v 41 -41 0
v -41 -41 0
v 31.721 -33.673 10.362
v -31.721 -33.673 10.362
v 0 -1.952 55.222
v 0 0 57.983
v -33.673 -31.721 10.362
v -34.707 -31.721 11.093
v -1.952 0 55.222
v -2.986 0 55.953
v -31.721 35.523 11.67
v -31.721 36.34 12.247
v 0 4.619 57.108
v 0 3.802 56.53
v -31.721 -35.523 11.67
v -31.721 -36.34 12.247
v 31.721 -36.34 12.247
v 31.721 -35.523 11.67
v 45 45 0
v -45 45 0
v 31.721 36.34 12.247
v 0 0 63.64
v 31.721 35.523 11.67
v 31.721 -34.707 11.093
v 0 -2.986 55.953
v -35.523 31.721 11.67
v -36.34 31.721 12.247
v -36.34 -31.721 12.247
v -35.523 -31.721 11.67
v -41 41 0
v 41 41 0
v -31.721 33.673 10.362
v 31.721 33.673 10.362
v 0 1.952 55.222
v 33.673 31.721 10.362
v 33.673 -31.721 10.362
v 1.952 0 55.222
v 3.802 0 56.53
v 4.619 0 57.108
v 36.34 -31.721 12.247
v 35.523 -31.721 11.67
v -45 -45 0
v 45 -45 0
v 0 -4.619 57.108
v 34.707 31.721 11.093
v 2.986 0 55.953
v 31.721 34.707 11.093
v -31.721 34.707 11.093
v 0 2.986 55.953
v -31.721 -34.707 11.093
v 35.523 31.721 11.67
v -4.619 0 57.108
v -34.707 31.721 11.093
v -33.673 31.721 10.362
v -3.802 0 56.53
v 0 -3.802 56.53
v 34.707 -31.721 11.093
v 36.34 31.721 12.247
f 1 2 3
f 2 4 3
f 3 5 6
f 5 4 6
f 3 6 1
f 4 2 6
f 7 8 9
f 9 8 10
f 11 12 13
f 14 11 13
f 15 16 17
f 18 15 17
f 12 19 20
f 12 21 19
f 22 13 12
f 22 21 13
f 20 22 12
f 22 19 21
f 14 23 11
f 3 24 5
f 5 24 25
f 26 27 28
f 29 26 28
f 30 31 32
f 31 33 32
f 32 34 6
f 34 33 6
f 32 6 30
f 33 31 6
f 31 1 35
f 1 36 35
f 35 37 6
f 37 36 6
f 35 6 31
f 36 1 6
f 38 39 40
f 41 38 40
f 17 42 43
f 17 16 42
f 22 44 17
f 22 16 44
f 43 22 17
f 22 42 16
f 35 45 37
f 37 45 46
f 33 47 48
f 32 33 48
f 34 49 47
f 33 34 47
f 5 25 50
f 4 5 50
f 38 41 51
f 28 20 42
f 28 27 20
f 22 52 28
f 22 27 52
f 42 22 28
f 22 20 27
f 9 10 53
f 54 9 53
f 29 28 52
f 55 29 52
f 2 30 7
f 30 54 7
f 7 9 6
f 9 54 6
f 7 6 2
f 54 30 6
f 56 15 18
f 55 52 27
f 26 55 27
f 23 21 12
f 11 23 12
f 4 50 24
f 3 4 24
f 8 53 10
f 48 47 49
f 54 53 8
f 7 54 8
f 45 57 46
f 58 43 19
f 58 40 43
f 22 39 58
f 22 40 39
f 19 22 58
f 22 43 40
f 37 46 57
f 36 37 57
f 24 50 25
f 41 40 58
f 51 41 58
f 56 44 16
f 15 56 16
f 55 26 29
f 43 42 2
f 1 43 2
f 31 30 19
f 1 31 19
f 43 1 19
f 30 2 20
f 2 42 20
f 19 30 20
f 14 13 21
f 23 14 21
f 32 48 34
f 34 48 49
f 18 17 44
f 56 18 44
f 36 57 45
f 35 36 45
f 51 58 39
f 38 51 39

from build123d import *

# Parameters (mm, degrees)
F3_W      = 90
F3_H      = 90
F8_W      = 82
F8_H      = 82
F14_DEPTH = 1
F15_START = -2
F15_DEPTH = 3
F17_DEPTH = 1
F18_START = -2
F18_DEPTH = 3
F20_DEPTH = 1
F21_START = -2
F21_DEPTH = 3
F23_DEPTH = 1
F24_START = -2
F24_DEPTH = 3


with BuildPart() as f6:
    # F3 (on Top) → F6 section 0
    with BuildSketch(Plane.XY, mode=Mode.PRIVATE) as f6_s0:
        Rectangle(F3_W, F3_H)
    loft([f6_s0.sketch, Vertex(0, 0, 63.6396103068)])

    # F8 (on Top) → F10 section 0
    with BuildSketch(Plane.XY, mode=Mode.PRIVATE) as f10_s0:
        Rectangle(F8_W, F8_H)
    loft([f10_s0.sketch, Vertex(0, 0, 57.9827560573)], mode=Mode.SUBTRACT)

    # F13 (on offset) → F14 (cut)
    with BuildSketch(Plane(origin=(0, -30, 21.2132034356), x_dir=(1, 0, 0), z_dir=(0, -0.8164965809, 0.5773502692))):
        Polygon((31.7209438086, -10.9807621135), (0, 43.9615242271), (-31.7209438086, -10.9807621135), align=None)
    extrude(amount=-F14_DEPTH, mode=Mode.SUBTRACT)

    # F13 (on offset) → F15 (cut)
    with BuildSketch(Plane(origin=(0, -30, 21.2132034356), x_dir=(1, 0, 0), z_dir=(0, -0.8164965809, 0.5773502692)).offset(F15_START)):
        Polygon((31.7209438086, -10.9807621135), (0, 43.9615242271), (-31.7209438086, -10.9807621135), align=None)
    extrude(amount=-F15_DEPTH, mode=Mode.SUBTRACT)

    # F16 (on offset) → F17 (cut)
    with BuildSketch(Plane(origin=(-30, 0, 21.2132034356), x_dir=(0, -1, 0), z_dir=(-0.8164965809, 0, 0.5773502692))):
        Polygon((31.7209438086, -10.9807621135), (0, 43.9615242271), (-31.7209438086, -10.9807621135), align=None)
    extrude(amount=-F17_DEPTH, mode=Mode.SUBTRACT)

    # F16 (on offset) → F18 (cut)
    with BuildSketch(Plane(origin=(-30, 0, 21.2132034356), x_dir=(0, -1, 0), z_dir=(-0.8164965809, 0, 0.5773502692)).offset(F18_START)):
        Polygon((31.7209438086, -10.9807621135), (0, 43.9615242271), (-31.7209438086, -10.9807621135), align=None)
    extrude(amount=-F18_DEPTH, mode=Mode.SUBTRACT)

    # F19 (on face) → F20 (cut)
    with BuildSketch(Plane(origin=(0, 30, 21.2132034356), x_dir=(-1, 0, 0), z_dir=(0, 0.8164965809, 0.5773502692))):
        Polygon((31.7209438086, -10.9807621135), (0, 43.9615242271), (-31.7209438086, -10.9807621135), align=None)
    extrude(amount=-F20_DEPTH, mode=Mode.SUBTRACT)

    # F19 (on face) → F21 (cut)
    with BuildSketch(Plane(origin=(0, 30, 21.2132034356), x_dir=(-1, 0, 0), z_dir=(0, 0.8164965809, 0.5773502692)).offset(F21_START)):
        Polygon((31.7209438086, -10.9807621135), (0, 43.9615242271), (-31.7209438086, -10.9807621135), align=None)
    extrude(amount=-F21_DEPTH, mode=Mode.SUBTRACT)

    # F22 (on face) → F23 (cut)
    with BuildSketch(Plane(origin=(30, 0, 21.2132034356), x_dir=(0, 1, 0), z_dir=(0.8164965809, 0, 0.5773502692))):
        Polygon((31.7209438086, -10.9807621135), (0, 43.9615242271), (-31.7209438086, -10.9807621135), align=None)
    extrude(amount=-F23_DEPTH, mode=Mode.SUBTRACT)

    # F22 (on face) → F24 (cut)
    with BuildSketch(Plane(origin=(30, 0, 21.2132034356), x_dir=(0, 1, 0), z_dir=(0.8164965809, 0, 0.5773502692)).offset(F24_START)):
        Polygon((31.7209438086, -10.9807621135), (0, 43.9615242271), (-31.7209438086, -10.9807621135), align=None)
    extrude(amount=-F24_DEPTH, mode=Mode.SUBTRACT)


solid = f6.part
